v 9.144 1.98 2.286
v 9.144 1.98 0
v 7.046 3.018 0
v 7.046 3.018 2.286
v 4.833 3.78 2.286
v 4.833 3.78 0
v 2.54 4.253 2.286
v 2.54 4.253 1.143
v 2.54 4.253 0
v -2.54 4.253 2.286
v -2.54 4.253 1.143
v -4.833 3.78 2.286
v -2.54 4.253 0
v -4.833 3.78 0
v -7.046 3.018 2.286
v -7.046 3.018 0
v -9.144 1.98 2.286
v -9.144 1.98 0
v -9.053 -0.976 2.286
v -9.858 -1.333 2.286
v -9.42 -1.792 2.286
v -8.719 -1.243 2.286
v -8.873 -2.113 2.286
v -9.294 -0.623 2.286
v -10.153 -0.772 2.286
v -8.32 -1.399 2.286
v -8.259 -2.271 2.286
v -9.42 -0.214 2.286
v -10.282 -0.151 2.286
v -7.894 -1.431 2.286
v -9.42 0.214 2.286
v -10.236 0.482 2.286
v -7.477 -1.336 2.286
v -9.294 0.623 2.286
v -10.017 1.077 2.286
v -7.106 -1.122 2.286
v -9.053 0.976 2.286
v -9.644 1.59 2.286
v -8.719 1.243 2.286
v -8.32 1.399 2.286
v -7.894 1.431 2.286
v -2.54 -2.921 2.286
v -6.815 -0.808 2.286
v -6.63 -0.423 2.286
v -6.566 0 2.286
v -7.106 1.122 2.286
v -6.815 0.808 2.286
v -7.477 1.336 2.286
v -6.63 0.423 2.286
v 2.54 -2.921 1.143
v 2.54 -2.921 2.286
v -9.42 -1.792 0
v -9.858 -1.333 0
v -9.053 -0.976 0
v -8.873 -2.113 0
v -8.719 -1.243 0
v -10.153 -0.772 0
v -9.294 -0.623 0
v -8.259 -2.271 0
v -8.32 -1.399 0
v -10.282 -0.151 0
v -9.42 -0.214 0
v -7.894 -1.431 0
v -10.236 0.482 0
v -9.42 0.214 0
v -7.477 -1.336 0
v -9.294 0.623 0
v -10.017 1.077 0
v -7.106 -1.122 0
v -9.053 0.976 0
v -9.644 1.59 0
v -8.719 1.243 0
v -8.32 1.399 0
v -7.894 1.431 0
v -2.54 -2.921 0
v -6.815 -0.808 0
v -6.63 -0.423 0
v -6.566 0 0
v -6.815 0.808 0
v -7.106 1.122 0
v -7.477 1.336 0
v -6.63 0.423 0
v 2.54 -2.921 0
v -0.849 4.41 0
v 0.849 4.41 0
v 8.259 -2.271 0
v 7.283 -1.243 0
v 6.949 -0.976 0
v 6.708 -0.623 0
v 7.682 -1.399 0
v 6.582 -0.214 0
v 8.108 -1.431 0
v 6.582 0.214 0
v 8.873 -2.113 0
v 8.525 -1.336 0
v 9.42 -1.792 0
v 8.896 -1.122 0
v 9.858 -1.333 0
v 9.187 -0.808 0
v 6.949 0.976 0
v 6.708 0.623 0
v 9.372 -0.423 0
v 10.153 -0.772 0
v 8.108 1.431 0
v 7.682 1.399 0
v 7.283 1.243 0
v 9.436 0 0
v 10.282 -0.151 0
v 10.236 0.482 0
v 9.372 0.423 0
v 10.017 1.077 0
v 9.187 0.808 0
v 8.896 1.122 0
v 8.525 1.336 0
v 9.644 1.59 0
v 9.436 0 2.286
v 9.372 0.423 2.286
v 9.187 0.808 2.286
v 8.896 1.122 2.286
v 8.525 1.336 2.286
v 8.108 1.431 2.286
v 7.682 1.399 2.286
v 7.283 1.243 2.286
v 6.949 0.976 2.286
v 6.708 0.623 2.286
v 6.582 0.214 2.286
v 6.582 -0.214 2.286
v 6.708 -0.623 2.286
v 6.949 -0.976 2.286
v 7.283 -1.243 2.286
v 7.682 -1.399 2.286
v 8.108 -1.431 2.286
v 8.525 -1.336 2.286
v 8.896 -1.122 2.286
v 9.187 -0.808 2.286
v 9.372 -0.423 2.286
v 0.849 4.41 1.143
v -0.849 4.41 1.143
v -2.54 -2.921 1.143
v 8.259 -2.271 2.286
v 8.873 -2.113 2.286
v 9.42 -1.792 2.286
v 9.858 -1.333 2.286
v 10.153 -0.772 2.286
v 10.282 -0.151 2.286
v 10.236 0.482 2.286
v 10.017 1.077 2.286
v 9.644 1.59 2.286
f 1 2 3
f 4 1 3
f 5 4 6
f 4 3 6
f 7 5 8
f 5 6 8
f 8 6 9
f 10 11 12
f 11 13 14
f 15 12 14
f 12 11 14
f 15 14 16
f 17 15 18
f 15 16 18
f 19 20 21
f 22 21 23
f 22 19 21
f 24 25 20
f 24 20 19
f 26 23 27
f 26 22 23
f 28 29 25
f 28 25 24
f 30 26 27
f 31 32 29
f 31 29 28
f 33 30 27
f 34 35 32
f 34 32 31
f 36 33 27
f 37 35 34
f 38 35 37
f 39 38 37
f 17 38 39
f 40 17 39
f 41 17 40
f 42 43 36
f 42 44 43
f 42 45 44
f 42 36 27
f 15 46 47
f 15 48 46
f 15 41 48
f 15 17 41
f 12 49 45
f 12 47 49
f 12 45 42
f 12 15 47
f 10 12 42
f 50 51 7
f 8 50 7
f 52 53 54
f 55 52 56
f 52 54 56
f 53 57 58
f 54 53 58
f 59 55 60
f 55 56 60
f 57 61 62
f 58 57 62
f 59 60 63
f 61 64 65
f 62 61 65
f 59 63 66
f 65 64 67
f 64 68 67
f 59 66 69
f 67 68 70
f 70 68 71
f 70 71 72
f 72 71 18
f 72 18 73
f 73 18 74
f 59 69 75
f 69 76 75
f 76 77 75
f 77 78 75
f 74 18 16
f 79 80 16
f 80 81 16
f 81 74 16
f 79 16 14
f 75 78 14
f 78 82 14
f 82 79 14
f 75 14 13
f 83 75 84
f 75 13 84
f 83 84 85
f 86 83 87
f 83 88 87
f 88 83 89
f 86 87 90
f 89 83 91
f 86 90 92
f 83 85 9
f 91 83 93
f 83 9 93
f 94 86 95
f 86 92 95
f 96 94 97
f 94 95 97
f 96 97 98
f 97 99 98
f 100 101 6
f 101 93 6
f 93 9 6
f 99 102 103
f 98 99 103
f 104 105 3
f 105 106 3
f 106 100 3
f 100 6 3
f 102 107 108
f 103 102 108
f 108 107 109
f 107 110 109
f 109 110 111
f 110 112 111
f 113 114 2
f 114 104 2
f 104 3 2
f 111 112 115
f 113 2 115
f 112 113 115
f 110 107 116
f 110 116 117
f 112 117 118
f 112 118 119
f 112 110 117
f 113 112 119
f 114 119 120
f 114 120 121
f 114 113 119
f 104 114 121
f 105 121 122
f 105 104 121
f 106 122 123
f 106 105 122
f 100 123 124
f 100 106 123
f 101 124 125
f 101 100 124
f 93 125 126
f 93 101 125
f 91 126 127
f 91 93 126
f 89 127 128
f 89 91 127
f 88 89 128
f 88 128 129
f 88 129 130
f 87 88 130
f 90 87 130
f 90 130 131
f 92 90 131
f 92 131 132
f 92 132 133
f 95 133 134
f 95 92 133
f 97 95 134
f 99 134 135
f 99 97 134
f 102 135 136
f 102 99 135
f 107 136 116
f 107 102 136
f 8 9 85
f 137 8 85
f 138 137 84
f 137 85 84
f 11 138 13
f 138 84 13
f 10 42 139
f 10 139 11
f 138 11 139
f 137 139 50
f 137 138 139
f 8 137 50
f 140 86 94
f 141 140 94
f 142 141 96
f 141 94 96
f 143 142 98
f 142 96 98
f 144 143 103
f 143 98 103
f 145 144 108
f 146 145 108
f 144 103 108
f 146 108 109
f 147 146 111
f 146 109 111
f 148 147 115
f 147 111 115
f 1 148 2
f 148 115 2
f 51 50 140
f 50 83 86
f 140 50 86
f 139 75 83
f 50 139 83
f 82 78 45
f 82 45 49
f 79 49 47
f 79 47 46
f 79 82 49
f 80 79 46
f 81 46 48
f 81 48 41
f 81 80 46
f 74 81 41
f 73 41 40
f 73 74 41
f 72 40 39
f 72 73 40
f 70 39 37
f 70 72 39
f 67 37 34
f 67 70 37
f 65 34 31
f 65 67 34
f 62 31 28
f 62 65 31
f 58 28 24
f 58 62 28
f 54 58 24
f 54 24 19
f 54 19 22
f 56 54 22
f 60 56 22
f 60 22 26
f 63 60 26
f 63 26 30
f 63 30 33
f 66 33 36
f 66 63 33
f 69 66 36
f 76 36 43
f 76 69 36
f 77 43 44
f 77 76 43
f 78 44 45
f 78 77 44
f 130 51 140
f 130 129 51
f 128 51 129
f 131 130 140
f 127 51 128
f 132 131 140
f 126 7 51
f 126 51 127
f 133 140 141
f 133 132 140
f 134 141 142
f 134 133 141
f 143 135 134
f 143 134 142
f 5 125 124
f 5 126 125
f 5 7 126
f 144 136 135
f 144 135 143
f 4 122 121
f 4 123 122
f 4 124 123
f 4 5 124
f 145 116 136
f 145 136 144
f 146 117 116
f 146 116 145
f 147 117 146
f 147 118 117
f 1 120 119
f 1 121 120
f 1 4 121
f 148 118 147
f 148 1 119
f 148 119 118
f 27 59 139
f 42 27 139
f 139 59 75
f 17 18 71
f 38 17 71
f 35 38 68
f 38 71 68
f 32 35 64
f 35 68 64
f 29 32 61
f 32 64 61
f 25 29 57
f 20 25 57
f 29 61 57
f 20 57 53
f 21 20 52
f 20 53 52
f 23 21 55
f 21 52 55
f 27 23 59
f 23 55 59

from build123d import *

# Parameters (mm, degrees)
F0_R     = 1.4351
F1_DEPTH = 2.286
F2_W     = 5.08
F2_H     = 10.621818
F3_DEPTH = 1.143


with BuildPart() as f1:
    # F0 (on Top) → F1 (new body)
    with BuildSketch(Plane.XY):
        with BuildLine():
            ThreePointArc((-2.54, 4.252614), (-5.951509, 3.434359), (-9.144, 1.979734))
            ThreePointArc((-9.144, 1.979734), (-10.239018, -0.46591), (-8.259002, -2.271394))
            Line((-8.259002, -2.271394), (-2.54, -2.921))
            Line((-2.54, -2.921), (-2.54, 4.252614))
        make_face()
        with Locations((-8.001, 0)):
            Circle(F0_R, mode=Mode.SUBTRACT)
        with BuildLine():
            ThreePointArc((2.54, 4.252614), (0, 4.429861), (-2.54, 4.252614))
            Line((-2.54, 4.252614), (-2.54, -2.921))
            Line((-2.54, -2.921), (2.54, -2.921))
            Line((2.54, -2.921), (2.54, 4.252614))
        make_face()
        with BuildLine():
            ThreePointArc((9.144, 1.979734), (5.951509, 3.434359), (2.54, 4.252614))
            Line((2.54, 4.252614), (2.54, -2.921))
            Line((2.54, -2.921), (8.259002, -2.271394))
            ThreePointArc((8.259002, -2.271394), (10.239018, -0.46591), (9.144, 1.979734))
        make_face()
        with Locations((8.001, 0)):
            Circle(F0_R, mode=Mode.SUBTRACT)
    extrude(amount=F1_DEPTH)

    # F2 (on face) → F3 (cut)
    with BuildSketch(Plane.XY.offset(2.286)):
        with Locations((0, 0.276294)):
            Rectangle(F2_W, F2_H)
    extrude(amount=-F3_DEPTH, mode=Mode.SUBTRACT)


solid = f1.part
